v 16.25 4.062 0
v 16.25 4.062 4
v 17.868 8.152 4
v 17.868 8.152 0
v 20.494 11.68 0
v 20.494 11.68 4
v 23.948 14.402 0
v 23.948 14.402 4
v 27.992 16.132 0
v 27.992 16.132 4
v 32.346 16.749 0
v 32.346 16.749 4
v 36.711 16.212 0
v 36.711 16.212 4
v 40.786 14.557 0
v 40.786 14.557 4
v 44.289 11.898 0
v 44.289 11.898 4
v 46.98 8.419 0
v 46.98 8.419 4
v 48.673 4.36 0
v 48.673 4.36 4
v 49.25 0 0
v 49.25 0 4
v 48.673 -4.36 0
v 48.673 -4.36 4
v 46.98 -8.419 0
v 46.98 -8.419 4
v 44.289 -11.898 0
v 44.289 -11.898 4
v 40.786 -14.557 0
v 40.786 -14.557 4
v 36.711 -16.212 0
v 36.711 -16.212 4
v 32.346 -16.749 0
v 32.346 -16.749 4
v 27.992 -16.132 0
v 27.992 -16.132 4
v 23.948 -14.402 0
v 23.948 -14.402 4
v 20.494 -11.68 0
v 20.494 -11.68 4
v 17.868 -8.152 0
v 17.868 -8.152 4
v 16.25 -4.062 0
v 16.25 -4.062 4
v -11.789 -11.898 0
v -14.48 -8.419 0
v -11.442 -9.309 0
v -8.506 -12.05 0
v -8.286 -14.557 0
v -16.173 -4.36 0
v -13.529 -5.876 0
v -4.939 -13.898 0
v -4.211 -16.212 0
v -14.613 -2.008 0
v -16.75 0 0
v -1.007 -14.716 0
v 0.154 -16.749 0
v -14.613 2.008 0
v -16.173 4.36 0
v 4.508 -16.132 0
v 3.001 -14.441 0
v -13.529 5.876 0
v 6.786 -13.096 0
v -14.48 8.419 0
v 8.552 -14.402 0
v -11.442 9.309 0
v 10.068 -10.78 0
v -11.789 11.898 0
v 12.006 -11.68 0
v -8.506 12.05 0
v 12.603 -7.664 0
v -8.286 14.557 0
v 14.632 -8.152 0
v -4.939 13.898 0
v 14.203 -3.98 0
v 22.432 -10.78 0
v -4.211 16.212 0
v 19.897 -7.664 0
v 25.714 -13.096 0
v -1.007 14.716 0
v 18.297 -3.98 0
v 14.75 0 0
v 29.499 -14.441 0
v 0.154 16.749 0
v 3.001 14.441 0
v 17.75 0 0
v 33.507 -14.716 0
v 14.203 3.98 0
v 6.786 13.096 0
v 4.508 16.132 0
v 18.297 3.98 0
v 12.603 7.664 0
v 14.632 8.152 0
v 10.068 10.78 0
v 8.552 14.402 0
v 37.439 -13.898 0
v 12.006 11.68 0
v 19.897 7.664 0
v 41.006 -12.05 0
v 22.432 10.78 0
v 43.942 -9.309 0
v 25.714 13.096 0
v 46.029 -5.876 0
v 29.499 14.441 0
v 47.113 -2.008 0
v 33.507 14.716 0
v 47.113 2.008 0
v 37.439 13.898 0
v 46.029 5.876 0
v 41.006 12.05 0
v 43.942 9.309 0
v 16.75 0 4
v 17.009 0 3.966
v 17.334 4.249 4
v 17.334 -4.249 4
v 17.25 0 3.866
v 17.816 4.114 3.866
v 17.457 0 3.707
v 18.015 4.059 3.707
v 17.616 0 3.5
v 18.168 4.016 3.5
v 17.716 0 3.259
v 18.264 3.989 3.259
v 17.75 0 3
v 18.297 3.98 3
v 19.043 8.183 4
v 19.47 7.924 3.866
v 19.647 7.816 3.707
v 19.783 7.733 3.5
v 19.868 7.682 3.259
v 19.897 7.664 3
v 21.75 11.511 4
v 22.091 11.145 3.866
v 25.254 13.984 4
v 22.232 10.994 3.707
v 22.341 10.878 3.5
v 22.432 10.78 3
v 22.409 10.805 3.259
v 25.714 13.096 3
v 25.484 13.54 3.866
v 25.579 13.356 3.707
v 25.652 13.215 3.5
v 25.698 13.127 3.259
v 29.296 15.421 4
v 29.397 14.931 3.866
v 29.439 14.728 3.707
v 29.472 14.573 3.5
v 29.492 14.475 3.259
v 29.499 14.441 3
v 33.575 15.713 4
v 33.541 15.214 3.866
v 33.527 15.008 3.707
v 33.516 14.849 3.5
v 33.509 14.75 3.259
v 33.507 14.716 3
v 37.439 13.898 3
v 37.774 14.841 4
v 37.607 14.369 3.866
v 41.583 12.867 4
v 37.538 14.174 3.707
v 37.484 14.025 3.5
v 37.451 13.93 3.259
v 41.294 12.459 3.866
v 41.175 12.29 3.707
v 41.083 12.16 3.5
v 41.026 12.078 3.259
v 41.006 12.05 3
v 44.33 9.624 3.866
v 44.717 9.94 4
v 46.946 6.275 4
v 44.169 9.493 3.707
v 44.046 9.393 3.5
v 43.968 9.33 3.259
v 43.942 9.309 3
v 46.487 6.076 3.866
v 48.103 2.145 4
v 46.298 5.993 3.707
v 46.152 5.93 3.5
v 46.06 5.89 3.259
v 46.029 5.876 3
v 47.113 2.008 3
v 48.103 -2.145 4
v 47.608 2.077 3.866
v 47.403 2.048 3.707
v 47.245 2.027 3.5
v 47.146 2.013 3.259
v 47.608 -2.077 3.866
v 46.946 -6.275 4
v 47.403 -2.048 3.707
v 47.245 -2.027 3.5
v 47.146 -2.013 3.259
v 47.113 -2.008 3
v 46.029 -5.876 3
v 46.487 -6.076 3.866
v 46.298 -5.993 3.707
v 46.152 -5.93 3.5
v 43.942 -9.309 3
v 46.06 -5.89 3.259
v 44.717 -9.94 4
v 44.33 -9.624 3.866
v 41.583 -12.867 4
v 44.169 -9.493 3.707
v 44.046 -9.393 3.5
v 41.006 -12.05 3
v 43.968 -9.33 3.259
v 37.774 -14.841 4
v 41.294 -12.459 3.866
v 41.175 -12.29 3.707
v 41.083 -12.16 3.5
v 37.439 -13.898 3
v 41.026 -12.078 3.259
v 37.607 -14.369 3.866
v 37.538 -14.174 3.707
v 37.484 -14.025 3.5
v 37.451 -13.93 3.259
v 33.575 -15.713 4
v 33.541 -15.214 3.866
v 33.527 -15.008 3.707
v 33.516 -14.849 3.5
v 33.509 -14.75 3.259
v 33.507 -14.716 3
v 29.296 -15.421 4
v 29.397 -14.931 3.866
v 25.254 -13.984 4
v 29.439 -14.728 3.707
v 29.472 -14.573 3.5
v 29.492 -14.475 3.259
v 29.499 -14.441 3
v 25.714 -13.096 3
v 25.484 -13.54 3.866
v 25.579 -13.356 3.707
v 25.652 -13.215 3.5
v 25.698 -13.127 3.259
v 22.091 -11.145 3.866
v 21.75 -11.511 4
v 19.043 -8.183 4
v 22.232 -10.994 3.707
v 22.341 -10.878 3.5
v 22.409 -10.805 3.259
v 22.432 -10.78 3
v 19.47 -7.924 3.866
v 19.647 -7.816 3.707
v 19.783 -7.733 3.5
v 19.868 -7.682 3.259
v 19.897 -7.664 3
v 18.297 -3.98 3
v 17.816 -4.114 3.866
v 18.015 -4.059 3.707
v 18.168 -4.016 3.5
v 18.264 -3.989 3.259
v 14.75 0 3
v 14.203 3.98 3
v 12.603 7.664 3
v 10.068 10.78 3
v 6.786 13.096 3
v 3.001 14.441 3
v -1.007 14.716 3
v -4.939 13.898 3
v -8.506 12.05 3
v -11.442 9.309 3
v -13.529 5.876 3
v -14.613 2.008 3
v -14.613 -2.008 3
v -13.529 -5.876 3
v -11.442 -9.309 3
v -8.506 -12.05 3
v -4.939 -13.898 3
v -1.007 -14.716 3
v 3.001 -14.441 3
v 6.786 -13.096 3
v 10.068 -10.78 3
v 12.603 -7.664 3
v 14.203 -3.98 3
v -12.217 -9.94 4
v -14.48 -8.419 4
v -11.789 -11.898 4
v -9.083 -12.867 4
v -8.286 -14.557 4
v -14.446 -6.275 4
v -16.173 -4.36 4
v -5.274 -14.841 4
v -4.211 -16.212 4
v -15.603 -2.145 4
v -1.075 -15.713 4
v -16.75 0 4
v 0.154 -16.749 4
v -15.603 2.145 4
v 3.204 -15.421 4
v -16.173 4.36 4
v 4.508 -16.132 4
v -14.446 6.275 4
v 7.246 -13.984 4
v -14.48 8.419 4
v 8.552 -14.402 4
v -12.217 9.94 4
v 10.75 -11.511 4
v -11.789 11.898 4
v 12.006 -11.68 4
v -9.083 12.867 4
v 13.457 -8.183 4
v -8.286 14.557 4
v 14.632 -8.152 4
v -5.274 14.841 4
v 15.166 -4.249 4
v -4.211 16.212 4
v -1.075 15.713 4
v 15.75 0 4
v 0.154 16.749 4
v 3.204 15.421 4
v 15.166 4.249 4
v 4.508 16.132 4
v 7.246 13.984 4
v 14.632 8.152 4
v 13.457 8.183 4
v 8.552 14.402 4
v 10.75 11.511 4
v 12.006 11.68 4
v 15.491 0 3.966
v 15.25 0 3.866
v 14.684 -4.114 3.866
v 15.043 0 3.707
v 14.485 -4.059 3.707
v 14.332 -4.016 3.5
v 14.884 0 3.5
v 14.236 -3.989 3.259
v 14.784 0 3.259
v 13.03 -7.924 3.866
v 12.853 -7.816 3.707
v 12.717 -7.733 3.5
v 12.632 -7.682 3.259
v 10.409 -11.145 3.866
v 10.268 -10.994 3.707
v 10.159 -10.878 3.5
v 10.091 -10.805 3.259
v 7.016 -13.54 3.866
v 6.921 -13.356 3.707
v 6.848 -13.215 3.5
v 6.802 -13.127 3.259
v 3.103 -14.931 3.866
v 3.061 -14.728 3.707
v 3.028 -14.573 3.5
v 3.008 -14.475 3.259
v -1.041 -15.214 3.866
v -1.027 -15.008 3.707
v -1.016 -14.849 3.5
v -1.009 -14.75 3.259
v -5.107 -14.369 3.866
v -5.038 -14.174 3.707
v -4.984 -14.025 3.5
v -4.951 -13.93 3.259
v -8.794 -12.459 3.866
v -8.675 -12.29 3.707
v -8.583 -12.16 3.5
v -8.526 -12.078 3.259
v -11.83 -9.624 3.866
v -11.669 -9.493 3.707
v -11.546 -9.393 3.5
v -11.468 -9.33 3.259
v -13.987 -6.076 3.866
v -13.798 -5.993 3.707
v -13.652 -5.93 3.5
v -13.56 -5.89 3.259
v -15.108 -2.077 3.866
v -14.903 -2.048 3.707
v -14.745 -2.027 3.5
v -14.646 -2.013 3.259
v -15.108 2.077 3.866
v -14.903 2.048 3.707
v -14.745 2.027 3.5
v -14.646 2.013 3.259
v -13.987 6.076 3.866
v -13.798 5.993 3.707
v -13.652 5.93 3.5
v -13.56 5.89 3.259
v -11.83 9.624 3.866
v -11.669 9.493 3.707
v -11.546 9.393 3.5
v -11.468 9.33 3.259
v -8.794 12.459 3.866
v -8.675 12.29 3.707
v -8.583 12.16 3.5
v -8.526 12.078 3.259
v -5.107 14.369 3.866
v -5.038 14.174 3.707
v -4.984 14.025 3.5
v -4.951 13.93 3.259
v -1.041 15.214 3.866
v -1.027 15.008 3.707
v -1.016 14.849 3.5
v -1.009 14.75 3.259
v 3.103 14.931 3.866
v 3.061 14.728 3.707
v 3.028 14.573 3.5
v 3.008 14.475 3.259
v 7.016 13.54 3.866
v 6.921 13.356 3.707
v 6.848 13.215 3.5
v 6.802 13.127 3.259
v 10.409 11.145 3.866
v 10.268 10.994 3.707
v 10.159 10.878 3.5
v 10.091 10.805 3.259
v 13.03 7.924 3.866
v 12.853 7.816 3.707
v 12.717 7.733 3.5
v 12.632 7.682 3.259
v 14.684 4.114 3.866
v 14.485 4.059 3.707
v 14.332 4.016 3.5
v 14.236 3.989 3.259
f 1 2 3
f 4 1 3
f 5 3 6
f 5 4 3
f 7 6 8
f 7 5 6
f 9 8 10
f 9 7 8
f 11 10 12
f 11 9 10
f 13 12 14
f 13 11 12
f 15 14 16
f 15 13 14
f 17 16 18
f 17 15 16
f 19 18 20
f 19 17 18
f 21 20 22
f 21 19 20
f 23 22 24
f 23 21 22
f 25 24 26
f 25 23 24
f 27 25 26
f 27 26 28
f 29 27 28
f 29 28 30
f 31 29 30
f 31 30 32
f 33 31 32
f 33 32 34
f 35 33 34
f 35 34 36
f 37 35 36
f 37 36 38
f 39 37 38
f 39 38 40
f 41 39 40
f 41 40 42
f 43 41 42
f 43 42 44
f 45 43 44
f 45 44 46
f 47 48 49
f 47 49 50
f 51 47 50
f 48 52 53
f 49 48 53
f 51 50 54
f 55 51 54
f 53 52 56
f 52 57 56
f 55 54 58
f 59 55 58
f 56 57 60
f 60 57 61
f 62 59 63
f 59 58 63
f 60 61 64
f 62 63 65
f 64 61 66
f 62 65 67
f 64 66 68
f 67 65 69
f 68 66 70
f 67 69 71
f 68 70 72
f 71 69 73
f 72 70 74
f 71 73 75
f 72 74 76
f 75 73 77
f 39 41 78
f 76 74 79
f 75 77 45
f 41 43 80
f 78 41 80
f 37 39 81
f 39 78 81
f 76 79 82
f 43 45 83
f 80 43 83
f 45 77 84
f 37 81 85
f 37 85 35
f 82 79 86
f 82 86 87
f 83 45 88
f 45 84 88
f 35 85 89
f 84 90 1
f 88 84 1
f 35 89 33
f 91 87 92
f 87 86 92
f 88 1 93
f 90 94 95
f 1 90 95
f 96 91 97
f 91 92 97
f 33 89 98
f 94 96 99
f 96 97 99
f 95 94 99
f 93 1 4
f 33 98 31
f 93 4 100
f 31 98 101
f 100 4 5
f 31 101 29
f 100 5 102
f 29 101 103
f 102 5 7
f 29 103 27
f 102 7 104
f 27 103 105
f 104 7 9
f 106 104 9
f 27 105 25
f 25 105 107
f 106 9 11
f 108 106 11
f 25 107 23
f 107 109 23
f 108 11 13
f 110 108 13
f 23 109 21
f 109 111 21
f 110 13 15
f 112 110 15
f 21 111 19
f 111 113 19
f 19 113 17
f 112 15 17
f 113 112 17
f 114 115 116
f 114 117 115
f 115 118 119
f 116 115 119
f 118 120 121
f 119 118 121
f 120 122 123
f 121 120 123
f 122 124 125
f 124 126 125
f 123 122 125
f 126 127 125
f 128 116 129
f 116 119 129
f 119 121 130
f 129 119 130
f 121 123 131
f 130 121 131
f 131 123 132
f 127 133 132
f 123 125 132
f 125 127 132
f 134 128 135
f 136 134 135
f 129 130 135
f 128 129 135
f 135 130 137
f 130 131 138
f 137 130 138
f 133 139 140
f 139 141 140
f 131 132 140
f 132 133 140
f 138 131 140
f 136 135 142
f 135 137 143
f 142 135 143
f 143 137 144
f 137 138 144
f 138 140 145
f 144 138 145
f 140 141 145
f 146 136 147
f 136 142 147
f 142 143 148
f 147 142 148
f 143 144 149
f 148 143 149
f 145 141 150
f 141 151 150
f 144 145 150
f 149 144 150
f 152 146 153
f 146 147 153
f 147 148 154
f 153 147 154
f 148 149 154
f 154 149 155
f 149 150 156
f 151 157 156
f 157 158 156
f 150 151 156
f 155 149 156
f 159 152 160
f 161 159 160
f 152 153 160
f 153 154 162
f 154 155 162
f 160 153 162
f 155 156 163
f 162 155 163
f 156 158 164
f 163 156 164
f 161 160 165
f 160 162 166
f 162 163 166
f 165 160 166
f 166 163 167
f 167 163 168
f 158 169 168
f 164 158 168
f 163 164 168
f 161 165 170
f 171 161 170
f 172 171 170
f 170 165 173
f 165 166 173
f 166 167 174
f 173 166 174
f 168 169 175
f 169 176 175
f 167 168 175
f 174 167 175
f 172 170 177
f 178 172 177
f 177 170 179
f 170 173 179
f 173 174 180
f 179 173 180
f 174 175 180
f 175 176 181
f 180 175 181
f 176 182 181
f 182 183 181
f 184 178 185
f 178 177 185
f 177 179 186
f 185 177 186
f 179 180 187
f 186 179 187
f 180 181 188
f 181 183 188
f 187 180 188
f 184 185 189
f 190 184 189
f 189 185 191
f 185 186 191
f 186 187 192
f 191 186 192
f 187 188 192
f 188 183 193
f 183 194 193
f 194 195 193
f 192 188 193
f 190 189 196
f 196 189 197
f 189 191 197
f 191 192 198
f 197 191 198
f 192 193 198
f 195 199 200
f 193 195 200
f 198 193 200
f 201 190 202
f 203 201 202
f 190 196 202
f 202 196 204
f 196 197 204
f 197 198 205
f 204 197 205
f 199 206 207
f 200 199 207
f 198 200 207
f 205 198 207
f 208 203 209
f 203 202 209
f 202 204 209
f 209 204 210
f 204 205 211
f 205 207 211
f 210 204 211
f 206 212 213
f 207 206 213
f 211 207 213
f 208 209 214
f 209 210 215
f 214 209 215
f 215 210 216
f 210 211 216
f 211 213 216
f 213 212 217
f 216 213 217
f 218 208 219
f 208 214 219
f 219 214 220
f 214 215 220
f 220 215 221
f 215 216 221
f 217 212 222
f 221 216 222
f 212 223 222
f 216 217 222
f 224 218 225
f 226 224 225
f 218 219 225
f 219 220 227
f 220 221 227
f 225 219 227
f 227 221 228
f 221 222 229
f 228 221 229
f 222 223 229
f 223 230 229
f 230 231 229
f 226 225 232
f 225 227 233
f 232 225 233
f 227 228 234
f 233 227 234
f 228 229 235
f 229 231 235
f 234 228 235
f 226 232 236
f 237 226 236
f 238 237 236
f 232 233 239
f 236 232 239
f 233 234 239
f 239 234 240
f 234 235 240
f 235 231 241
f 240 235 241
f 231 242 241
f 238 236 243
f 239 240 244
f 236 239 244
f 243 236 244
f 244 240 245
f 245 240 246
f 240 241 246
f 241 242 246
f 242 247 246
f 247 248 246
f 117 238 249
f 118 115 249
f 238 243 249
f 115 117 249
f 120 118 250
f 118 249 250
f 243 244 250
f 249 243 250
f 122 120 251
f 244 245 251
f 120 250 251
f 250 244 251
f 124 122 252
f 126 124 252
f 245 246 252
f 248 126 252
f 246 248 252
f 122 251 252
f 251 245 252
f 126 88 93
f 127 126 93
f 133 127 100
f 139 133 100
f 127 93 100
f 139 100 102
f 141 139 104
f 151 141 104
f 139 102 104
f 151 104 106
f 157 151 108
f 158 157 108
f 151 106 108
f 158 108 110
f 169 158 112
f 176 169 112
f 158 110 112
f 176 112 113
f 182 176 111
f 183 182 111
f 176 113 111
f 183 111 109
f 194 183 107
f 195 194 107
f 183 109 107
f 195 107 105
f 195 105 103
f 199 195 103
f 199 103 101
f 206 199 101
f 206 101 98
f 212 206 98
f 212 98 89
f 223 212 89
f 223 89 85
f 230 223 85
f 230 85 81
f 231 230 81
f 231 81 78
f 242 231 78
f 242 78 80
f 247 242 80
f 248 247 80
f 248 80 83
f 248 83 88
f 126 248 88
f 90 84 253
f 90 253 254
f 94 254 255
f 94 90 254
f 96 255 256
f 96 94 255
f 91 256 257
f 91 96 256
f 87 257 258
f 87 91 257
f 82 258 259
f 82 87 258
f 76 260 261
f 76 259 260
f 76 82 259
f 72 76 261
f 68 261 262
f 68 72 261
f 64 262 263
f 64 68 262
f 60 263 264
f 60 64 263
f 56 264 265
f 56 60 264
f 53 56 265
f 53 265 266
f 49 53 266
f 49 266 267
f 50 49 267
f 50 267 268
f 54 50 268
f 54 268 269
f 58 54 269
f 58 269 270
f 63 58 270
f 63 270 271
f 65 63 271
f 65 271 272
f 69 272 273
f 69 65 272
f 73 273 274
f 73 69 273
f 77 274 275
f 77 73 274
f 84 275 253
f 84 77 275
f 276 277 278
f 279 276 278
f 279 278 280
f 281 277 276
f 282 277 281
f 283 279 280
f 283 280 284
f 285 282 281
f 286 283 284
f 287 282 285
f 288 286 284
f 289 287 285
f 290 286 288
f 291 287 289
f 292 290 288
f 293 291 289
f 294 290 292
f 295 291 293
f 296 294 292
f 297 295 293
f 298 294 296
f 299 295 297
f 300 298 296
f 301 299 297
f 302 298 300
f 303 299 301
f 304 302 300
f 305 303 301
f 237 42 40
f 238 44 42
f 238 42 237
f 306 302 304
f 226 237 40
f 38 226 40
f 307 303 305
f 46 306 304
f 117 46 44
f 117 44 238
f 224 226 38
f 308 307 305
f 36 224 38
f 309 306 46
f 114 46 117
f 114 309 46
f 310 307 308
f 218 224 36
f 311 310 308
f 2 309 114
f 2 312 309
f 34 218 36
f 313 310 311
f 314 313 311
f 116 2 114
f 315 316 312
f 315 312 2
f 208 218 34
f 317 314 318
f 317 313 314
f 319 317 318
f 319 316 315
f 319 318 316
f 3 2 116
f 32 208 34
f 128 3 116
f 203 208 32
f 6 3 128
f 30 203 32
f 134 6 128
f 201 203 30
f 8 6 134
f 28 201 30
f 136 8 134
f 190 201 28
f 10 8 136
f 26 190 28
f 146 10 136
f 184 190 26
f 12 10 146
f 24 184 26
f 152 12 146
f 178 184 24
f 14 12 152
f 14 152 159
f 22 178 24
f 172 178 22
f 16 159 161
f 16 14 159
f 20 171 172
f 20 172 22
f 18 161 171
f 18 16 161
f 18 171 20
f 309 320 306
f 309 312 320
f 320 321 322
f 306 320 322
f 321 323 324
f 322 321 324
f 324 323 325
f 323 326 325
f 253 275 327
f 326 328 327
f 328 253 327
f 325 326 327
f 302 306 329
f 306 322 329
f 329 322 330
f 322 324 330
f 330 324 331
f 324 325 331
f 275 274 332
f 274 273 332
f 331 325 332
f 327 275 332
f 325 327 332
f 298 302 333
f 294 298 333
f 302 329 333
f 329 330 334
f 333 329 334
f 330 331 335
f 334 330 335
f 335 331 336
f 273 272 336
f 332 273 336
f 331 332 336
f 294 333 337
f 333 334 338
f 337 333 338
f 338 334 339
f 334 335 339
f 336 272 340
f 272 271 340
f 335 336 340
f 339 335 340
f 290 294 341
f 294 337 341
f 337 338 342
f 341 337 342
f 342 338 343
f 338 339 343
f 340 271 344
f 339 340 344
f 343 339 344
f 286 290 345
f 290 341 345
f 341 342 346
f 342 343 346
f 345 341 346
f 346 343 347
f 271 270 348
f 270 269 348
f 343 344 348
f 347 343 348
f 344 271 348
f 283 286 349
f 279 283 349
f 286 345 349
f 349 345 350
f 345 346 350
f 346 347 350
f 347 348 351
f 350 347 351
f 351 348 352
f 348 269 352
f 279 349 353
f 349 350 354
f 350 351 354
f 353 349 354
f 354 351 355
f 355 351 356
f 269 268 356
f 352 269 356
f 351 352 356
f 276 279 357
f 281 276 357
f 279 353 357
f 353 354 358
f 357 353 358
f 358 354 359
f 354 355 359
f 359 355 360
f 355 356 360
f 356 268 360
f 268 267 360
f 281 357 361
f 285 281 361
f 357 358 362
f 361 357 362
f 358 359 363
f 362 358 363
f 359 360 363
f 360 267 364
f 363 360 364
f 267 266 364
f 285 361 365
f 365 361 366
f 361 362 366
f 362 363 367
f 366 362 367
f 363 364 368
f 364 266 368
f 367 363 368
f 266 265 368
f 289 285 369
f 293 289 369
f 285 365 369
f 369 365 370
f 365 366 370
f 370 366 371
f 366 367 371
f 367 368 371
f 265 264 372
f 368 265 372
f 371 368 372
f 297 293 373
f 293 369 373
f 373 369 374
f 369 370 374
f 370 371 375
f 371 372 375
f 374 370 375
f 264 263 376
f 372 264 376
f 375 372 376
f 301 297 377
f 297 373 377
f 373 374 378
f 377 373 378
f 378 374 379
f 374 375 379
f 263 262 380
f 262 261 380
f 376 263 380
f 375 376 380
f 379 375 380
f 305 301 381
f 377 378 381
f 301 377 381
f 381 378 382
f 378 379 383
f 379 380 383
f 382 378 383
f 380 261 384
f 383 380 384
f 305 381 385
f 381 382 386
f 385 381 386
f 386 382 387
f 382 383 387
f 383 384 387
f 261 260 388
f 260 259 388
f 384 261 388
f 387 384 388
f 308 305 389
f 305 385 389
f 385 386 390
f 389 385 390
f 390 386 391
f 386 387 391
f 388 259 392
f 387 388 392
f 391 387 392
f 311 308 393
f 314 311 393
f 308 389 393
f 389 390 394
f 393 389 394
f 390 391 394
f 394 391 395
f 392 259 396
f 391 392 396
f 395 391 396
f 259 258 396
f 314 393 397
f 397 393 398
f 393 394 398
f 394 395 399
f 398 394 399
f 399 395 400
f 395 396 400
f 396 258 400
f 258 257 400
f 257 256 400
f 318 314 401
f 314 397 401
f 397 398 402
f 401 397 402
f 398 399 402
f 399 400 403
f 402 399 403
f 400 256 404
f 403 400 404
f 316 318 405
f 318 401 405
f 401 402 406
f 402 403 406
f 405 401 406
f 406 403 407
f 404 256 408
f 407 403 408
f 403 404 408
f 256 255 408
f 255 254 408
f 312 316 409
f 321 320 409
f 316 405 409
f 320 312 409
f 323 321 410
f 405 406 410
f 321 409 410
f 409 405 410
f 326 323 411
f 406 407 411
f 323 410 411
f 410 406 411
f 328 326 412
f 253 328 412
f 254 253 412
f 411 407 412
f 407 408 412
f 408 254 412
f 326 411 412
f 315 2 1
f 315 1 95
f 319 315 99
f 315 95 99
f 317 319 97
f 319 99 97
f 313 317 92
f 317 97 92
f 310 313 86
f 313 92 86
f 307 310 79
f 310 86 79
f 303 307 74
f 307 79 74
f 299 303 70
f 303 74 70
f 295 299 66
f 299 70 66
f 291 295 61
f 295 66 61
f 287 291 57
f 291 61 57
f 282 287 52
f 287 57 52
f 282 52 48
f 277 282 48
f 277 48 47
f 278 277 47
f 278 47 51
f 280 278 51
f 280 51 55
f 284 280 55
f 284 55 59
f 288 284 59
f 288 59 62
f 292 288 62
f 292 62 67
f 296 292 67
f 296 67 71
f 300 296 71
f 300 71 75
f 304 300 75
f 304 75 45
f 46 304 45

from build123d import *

# Parameters (mm, degrees)
SKETCH2_R            = 16.75
BOSS_EXTRUDE2_DEPTH  = 4
SKETCH1_R            = 14.75
CUT_EXTRUDE1_DEPTH   = 20
FILLET1_R            = 1
FILLET1_OF_MIRROR5_R = 1


with BuildPart() as part:
    # Sketch2 → Boss-Extrude2 (new body)
    with BuildSketch(Plane.XY):
        Circle(SKETCH2_R)
    boss_extrude2 = extrude(amount=BOSS_EXTRUDE2_DEPTH)

    # Sketch1 → Cut-Extrude1 (cut)
    with BuildSketch(Plane.XY):
        Circle(SKETCH1_R)
    cut_extrude1 = extrude(amount=CUT_EXTRUDE1_DEPTH, mode=Mode.SUBTRACT)

    # Fillet1
    fillet1_edges = [part.edges().sort_by_distance(p)[0] for p in [
        (-14.75, 0, 4),
    ]]
    fillet(fillet1_edges, radius=FILLET1_R)

    # Mirror5: Boss-Extrude2, Cut-Extrude1 across plane
    add(boss_extrude2.mirror(Plane(origin=(16.25, 0, 0), x_dir=(0, 0, 1), z_dir=(1, 0, 0))))
    add(cut_extrude1.mirror(Plane(origin=(16.25, 0, 0), x_dir=(0, 0, 1), z_dir=(1, 0, 0))), mode=Mode.SUBTRACT)

    # Fillet1 of Mirror5
    fillet1_of_mirror5_edges = [part.edges().sort_by_distance(p)[0] for p in [
        (47.25, 0, 4),
    ]]
    fillet(fillet1_of_mirror5_edges, radius=FILLET1_OF_MIRROR5_R)


solid = part.part
